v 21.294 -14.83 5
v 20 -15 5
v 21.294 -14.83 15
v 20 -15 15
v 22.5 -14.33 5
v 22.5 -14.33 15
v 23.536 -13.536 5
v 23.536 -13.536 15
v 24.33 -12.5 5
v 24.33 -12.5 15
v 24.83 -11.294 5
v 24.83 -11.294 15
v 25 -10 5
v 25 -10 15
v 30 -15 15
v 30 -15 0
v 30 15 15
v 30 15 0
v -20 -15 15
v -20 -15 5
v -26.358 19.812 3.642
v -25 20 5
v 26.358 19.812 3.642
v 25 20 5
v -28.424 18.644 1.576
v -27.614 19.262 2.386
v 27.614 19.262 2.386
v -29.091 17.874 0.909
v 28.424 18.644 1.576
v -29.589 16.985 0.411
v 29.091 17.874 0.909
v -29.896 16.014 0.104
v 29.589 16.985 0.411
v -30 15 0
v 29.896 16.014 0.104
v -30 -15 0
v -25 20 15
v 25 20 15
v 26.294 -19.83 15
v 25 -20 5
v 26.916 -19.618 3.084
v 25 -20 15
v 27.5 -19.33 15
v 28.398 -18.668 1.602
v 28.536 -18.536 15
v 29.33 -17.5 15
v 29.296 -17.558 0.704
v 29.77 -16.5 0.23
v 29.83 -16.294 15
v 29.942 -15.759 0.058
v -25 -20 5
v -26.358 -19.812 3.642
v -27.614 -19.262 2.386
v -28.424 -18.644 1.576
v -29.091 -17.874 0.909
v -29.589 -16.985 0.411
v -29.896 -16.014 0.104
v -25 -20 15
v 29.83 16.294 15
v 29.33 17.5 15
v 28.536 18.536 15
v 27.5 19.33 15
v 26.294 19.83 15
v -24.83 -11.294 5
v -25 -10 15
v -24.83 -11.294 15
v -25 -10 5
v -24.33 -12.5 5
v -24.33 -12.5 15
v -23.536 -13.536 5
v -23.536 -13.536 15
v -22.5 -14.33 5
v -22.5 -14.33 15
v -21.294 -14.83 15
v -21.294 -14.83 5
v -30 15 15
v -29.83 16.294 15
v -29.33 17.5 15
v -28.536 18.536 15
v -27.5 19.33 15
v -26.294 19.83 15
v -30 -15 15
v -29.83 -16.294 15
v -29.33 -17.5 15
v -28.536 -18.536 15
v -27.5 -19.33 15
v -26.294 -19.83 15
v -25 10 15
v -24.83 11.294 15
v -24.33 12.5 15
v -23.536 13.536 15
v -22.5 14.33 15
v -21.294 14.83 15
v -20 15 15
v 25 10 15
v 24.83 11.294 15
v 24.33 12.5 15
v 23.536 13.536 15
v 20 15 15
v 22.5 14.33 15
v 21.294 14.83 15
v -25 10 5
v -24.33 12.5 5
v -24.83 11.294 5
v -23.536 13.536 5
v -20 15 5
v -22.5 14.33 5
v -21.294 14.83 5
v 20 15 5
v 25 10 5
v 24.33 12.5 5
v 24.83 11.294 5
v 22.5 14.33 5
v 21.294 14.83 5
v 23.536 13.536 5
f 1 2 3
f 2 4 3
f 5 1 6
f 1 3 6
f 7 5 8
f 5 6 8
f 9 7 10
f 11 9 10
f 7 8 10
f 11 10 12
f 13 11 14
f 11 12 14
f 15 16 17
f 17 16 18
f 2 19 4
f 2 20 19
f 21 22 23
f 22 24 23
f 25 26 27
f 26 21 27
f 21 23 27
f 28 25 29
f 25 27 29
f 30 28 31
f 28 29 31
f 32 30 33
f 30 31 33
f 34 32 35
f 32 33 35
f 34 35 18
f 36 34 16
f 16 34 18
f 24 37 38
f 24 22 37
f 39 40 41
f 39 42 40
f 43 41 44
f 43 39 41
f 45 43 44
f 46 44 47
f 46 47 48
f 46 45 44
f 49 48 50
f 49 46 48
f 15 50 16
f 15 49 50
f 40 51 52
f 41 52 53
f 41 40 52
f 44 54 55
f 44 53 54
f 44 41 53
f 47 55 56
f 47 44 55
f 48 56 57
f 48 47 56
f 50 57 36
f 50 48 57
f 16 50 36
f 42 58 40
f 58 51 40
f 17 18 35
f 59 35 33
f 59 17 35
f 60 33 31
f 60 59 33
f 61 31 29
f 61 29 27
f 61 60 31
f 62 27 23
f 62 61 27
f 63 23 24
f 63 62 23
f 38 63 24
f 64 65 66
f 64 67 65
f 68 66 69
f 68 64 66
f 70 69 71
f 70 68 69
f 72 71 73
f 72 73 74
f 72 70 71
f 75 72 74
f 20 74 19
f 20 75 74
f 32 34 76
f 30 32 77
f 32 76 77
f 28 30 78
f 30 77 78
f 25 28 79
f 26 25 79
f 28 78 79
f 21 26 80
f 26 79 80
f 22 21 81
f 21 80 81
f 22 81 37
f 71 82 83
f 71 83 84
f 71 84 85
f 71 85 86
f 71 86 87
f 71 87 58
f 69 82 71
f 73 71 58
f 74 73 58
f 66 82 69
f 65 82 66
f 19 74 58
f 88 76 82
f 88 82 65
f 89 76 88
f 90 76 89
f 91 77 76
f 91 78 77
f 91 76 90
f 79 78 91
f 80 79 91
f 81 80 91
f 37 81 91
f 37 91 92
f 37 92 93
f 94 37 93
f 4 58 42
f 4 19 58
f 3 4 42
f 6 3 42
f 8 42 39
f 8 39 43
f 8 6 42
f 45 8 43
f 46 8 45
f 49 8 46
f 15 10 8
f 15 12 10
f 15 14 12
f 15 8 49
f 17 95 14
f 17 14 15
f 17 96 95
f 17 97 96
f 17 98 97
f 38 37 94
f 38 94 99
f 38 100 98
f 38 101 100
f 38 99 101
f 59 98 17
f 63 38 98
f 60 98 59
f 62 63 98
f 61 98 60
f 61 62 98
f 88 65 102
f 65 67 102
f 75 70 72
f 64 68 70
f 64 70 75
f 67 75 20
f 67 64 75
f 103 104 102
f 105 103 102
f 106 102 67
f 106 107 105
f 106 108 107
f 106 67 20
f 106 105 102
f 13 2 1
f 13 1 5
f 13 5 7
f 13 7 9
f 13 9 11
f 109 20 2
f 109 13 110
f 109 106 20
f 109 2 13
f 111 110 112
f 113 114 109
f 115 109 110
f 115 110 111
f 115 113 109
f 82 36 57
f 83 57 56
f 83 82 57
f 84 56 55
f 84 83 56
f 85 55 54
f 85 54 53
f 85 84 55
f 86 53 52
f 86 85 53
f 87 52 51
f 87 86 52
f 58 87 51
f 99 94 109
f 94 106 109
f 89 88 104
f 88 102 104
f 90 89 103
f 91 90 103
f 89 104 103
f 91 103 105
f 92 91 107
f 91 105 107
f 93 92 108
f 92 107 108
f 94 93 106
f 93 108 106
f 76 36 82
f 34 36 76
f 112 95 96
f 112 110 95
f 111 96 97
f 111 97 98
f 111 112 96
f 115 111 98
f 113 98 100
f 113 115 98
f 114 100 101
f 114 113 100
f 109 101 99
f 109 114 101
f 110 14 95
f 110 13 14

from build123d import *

# Parameters (mm, degrees)
F0_W     = 60
F0_H     = 40
F1_DEPTH = 15
F2_T     = -5
F3_R     = 5


with BuildPart() as f1:
    # F0 (on Top) → F1 (new body)
    with BuildSketch(Plane.XY):
        Rectangle(F0_W, F0_H)
    extrude(amount=F1_DEPTH)

    # F2
    f2_openings = [f1.faces().sort_by_distance(p)[0] for p in [
        (0, 0, 15),
    ]]
    offset(amount=F2_T, openings=f2_openings)

    # F3
    f3_edges = [f1.edges().sort_by_distance(p)[0] for p in [
        (-30, 20, 7.5),
        (30, 20, 7.5),
        (-30, -20, 7.5),
        (30, -20, 7.5),
        (-25, -15, 10),
        (-25, 15, 10),
        (25, -15, 10),
        (25, 15, 10),
        (0, 20, 0),
        (0, -20, 0),
    ]]
    fillet(f3_edges, radius=F3_R)


solid = f1.part
